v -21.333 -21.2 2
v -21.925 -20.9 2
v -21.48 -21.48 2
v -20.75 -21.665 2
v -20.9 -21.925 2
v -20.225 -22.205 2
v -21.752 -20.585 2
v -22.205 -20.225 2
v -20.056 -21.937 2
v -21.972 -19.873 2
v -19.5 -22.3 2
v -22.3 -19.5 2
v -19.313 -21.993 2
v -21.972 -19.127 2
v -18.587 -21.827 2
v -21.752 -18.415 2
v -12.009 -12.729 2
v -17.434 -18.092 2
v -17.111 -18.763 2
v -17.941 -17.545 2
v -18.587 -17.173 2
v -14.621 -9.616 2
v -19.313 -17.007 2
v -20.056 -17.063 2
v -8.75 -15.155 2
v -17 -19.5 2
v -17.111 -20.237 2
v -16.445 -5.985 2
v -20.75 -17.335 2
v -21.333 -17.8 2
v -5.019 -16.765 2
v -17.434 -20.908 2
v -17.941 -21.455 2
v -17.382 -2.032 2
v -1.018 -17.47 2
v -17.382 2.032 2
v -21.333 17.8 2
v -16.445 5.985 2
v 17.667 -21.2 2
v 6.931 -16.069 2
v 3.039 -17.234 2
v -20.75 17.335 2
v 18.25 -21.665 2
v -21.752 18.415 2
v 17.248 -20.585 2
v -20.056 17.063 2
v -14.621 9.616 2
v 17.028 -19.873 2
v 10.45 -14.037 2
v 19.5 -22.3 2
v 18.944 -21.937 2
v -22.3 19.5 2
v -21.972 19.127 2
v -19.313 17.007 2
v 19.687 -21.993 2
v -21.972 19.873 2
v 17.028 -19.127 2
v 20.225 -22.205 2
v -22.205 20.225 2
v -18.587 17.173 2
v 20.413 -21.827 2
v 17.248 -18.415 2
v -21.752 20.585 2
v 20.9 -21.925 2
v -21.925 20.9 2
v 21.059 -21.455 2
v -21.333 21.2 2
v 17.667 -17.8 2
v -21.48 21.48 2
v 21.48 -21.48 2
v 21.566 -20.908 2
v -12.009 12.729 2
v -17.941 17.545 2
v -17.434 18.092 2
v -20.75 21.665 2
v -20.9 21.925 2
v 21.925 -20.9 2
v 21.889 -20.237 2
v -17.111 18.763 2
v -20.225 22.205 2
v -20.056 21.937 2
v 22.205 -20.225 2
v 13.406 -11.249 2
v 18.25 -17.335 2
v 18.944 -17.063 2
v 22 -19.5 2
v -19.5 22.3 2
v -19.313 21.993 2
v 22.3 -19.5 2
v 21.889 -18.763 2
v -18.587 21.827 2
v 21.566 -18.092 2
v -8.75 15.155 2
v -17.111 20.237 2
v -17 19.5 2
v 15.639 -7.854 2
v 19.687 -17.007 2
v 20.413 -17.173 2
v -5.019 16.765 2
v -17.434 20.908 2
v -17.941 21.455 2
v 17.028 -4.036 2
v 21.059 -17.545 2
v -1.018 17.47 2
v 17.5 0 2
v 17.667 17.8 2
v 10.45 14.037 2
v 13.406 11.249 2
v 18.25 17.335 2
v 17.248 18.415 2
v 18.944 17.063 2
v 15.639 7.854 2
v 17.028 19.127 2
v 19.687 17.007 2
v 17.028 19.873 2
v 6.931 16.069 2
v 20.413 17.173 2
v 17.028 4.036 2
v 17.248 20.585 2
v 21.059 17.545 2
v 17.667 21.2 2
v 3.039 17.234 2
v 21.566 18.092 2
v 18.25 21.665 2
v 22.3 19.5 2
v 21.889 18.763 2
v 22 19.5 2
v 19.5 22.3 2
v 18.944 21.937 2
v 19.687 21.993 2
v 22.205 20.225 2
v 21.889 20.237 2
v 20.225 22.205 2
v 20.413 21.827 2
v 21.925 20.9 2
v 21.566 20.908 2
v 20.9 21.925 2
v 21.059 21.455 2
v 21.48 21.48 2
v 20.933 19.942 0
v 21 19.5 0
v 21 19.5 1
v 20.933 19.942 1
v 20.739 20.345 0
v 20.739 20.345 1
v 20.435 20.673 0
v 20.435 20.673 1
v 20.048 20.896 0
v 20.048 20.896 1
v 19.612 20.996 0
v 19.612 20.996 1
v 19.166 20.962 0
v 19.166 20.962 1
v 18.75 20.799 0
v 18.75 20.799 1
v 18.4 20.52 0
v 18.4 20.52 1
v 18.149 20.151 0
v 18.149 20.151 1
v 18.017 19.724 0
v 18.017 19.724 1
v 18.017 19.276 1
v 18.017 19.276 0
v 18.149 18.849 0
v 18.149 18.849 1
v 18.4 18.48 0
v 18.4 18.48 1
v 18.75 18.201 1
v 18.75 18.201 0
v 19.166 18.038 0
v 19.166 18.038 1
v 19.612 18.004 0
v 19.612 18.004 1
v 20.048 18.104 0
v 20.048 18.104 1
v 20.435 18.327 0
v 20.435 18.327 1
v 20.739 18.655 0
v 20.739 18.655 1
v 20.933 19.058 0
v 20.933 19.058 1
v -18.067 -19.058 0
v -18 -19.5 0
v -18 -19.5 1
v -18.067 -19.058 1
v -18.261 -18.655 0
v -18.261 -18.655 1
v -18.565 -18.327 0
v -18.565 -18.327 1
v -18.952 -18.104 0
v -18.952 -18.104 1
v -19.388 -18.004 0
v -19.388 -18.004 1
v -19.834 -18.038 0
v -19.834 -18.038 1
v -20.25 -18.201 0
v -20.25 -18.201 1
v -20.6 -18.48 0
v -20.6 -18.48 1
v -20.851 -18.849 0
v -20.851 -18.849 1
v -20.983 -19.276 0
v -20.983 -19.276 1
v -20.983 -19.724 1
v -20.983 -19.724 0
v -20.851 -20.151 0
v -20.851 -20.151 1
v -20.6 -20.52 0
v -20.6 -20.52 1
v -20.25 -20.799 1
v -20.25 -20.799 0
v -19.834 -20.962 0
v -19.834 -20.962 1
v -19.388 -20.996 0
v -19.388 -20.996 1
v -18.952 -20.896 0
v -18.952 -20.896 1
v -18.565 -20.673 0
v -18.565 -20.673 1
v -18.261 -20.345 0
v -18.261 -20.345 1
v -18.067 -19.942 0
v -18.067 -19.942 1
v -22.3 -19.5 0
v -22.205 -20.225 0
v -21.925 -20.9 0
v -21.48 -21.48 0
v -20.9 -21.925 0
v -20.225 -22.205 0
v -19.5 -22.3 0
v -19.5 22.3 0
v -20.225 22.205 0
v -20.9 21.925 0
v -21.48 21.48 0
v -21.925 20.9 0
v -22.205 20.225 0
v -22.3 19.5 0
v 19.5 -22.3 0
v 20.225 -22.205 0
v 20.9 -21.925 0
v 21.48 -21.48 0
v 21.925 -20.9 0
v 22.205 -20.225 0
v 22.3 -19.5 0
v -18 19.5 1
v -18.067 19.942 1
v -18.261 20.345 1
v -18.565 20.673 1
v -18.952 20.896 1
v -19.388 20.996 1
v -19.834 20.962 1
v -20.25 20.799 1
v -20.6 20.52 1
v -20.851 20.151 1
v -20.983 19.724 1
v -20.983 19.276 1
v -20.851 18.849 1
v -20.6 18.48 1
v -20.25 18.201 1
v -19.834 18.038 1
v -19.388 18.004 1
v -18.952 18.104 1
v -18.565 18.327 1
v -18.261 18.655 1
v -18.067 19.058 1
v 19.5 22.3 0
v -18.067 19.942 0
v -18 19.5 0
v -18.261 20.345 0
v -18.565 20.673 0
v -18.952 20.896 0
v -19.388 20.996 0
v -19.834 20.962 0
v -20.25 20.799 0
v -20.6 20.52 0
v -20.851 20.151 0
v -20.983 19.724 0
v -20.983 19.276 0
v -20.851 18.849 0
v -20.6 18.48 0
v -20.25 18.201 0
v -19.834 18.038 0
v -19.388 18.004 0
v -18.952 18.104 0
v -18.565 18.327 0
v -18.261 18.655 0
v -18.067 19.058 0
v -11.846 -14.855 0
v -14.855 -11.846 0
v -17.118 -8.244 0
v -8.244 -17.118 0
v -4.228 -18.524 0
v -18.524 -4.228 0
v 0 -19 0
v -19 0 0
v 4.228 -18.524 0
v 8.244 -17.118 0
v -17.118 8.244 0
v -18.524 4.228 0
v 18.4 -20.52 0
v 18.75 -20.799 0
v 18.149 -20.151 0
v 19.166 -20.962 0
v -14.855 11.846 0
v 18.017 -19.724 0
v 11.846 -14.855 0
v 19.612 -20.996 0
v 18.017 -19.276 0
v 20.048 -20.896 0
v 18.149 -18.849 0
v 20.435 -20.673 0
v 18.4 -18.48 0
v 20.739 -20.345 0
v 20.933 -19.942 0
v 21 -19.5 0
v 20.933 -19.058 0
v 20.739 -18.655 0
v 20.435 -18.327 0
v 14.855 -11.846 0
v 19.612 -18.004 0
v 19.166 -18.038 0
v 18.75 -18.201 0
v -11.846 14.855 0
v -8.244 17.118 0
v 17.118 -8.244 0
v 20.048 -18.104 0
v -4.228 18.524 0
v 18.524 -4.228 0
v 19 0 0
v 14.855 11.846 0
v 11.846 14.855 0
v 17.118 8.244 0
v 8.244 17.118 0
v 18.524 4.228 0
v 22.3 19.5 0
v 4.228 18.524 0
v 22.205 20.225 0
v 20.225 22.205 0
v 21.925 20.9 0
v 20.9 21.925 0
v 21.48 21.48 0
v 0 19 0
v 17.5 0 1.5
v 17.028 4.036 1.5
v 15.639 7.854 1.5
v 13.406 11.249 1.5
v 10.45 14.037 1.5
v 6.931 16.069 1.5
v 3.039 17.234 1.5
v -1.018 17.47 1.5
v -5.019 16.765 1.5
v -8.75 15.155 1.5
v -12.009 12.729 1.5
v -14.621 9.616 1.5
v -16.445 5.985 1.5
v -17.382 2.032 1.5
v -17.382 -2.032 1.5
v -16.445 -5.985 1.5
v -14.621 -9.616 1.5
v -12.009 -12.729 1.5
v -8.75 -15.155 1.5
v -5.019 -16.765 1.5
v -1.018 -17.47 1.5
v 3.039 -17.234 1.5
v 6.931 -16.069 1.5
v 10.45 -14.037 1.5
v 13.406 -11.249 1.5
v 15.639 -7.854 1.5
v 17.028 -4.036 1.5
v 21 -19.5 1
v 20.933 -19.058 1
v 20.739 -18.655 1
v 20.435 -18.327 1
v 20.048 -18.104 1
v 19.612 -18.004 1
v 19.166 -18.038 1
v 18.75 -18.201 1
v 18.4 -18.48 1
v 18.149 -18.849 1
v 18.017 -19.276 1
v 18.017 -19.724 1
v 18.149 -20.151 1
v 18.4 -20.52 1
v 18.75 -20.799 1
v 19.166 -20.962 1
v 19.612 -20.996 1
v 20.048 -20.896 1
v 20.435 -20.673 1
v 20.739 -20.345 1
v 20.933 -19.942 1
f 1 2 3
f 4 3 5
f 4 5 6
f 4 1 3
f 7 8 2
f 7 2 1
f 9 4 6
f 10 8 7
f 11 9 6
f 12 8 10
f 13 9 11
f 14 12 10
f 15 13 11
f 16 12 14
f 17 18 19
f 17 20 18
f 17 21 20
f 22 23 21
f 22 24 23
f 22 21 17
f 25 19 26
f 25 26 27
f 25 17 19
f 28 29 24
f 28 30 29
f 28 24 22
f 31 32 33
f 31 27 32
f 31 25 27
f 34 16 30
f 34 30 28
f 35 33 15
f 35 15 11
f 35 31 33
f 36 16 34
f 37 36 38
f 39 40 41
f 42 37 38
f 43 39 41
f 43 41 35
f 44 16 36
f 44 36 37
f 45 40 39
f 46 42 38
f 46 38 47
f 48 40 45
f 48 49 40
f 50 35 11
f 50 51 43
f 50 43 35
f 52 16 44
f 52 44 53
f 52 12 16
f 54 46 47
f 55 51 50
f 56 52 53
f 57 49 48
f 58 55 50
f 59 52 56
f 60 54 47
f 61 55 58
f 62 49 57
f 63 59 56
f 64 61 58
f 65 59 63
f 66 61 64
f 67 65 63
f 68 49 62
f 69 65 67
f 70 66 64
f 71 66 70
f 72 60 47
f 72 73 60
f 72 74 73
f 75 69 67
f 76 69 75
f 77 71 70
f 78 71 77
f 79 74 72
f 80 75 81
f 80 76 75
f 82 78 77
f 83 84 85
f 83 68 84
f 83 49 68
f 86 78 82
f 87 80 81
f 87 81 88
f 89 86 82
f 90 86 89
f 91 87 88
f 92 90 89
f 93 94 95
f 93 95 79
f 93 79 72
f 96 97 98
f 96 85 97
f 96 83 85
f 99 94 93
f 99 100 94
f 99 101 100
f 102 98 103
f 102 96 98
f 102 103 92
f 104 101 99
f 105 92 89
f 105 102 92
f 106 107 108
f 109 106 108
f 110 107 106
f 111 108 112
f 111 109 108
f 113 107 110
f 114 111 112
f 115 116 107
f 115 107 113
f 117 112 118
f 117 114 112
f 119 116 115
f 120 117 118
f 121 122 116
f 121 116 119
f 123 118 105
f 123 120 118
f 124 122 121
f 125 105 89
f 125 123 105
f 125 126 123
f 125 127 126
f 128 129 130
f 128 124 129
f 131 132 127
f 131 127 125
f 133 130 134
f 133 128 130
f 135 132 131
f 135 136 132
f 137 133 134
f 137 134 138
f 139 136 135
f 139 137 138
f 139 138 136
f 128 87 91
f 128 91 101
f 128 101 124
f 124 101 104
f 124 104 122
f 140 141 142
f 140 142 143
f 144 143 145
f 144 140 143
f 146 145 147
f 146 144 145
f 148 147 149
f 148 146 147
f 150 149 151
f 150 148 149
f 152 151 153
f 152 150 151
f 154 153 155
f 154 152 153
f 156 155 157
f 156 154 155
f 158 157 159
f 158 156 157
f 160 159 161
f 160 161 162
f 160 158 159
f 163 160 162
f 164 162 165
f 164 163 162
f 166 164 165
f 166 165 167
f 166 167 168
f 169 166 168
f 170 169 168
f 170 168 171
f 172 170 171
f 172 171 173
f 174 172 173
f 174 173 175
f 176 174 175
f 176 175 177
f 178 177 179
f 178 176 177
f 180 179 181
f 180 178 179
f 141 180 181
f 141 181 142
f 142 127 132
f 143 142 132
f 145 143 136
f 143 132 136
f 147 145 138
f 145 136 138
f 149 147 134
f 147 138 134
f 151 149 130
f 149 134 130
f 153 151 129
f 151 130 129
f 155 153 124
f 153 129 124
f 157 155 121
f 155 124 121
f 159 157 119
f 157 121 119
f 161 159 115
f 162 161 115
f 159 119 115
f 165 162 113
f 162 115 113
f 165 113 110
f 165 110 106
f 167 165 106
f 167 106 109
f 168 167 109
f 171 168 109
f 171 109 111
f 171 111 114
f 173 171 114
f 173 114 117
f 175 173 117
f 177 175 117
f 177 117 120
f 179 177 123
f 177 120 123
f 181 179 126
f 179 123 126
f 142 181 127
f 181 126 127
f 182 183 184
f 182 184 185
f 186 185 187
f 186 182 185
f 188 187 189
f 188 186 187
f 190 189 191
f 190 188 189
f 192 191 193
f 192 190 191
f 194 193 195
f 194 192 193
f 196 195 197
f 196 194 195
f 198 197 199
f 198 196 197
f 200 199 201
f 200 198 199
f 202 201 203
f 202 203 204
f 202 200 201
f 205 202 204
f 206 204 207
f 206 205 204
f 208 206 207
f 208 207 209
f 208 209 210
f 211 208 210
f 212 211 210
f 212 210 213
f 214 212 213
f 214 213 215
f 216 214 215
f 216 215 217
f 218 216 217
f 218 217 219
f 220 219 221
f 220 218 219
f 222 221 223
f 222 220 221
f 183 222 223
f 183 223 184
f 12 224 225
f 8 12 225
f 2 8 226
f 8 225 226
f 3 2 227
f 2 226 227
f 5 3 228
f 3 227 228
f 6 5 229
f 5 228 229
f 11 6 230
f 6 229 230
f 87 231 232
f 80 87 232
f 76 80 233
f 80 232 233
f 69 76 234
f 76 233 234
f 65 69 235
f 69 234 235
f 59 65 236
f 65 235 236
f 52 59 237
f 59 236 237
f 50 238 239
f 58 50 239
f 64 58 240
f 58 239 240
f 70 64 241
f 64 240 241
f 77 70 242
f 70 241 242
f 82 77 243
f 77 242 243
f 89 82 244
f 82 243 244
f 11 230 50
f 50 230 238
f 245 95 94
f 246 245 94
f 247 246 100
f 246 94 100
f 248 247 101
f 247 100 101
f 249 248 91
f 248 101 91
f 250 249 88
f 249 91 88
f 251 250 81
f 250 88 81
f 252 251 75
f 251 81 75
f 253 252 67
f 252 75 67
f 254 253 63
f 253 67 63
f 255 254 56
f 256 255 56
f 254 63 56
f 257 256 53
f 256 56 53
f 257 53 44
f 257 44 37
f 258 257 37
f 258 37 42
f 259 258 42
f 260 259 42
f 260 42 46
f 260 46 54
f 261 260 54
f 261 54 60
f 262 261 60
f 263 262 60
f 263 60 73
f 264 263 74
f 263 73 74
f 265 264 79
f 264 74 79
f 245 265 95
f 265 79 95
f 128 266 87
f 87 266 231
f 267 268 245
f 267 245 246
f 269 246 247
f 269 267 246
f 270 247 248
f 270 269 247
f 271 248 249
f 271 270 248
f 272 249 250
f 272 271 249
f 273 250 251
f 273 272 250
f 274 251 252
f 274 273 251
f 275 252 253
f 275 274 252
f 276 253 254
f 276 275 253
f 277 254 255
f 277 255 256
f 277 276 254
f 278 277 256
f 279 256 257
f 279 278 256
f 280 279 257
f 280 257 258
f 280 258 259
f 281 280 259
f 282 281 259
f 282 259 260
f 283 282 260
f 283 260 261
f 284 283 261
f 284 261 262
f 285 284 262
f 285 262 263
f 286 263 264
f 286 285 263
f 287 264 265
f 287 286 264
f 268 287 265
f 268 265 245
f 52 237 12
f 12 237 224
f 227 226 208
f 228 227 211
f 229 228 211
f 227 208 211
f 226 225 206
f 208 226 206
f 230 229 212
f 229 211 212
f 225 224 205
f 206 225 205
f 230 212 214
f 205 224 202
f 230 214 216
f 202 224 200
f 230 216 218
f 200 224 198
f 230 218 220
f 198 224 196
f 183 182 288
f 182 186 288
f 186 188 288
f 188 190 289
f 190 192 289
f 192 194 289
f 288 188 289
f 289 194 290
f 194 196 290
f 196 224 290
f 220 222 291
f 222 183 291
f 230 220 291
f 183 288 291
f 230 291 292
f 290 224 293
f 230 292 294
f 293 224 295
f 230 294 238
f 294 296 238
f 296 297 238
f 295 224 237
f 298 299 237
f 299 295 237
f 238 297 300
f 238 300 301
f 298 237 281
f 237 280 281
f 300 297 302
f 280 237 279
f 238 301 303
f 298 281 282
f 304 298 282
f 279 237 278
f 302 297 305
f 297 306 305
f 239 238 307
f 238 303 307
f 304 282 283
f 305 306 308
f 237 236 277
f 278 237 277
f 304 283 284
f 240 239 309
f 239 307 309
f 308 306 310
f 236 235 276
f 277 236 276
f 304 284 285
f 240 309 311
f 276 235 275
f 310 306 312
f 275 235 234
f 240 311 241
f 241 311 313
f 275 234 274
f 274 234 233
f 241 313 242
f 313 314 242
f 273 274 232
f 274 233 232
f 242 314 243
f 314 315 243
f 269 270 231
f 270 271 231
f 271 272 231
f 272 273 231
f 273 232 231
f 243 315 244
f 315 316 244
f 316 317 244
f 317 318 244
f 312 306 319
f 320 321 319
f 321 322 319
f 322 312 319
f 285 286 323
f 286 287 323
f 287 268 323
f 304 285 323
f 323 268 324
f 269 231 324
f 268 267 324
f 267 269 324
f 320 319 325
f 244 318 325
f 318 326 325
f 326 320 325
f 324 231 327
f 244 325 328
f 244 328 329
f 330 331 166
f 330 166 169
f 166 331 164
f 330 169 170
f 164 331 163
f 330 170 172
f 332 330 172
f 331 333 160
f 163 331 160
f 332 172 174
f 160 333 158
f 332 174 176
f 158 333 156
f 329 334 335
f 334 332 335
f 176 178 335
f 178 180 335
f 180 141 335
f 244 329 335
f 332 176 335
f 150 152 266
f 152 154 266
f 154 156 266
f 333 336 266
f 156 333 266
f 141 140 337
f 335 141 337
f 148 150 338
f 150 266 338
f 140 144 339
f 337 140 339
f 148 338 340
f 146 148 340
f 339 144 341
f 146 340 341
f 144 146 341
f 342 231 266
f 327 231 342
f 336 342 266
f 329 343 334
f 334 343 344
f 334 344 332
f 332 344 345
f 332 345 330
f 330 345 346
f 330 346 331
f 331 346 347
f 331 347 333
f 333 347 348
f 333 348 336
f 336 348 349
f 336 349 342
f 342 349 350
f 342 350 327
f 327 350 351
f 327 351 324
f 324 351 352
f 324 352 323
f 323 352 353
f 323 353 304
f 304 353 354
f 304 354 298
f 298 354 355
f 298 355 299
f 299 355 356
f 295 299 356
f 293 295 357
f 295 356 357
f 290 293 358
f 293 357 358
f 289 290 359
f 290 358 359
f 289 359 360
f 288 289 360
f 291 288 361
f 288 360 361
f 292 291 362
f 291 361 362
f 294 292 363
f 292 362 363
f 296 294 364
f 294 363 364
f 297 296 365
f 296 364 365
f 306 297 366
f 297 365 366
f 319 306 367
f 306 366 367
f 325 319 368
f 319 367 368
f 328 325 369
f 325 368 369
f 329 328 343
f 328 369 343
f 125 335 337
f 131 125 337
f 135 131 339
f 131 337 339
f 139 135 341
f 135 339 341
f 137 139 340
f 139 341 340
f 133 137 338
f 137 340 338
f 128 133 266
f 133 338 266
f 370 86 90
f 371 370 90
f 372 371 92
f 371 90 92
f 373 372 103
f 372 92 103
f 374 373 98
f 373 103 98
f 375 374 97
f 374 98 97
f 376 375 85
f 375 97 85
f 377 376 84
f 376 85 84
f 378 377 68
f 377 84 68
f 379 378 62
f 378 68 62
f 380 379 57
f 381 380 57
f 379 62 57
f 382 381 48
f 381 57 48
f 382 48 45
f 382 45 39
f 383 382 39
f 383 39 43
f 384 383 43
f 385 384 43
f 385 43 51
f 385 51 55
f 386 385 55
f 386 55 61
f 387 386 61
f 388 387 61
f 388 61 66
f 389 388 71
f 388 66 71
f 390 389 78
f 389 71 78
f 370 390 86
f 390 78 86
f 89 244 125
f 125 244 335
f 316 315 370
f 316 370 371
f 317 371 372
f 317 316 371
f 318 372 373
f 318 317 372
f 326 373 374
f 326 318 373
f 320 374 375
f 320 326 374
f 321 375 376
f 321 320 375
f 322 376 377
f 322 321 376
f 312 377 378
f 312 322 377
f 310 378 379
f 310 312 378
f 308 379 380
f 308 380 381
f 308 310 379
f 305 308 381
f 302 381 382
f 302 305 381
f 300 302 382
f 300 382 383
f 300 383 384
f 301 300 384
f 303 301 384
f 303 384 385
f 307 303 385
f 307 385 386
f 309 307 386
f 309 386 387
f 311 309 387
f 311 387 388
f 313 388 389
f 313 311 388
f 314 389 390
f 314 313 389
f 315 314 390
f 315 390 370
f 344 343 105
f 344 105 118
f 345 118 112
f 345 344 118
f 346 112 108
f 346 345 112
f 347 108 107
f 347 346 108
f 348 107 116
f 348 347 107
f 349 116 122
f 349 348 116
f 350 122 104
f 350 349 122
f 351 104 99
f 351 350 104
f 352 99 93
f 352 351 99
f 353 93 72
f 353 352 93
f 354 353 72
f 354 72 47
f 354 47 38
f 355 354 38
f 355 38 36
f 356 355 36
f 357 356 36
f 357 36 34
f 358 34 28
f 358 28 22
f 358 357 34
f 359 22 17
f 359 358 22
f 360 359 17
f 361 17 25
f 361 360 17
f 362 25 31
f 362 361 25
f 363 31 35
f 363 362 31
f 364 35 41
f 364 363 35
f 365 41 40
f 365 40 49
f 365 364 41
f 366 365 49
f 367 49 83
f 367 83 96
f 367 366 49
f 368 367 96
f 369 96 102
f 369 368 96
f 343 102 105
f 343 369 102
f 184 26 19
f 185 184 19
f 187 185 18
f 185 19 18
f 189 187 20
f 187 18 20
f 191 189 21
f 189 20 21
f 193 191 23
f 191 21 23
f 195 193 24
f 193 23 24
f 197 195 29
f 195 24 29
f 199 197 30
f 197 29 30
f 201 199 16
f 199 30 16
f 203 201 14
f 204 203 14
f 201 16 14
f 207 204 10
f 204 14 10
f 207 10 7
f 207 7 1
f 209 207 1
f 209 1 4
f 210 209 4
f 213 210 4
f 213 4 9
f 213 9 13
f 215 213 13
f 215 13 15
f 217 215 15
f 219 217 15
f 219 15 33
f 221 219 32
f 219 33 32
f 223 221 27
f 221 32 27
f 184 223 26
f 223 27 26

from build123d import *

# Parameters (mm, degrees)
F0_R     = 1.5
F0_R_2   = 19
F0_R_3   = 17.5
F1_DEPTH = 2
F2_SIZE  = 1
F3_SIZE  = 1.5


with BuildPart() as f1:
    # F0 (on Top) → F1 (new body)
    with BuildSketch(Plane.XY):
        with BuildLine():
            Line((-22.3, 19.5), (-22.3, -19.5))
            ThreePointArc((-22.3, -19.5), (-21.4798989873, -21.4798989873), (-19.5, -22.3))
            Line((-19.5, -22.3), (19.5, -22.3))
            ThreePointArc((19.5, -22.3), (21.4798989873, -21.4798989873), (22.3, -19.5))
            Line((22.3, -19.5), (22.3, 19.5))
            ThreePointArc((22.3, 19.5), (21.4798989873, 21.4798989873), (19.5, 22.3))
            Line((19.5, 22.3), (-19.5, 22.3))
            ThreePointArc((-19.5, 22.3), (-21.4798989873, 21.4798989873), (-22.3, 19.5))
        make_face()
        with Locations((-19.5, -19.5)):
            Circle(F0_R, mode=Mode.SUBTRACT)
        with Locations((19.5, -19.5)):
            Circle(F0_R, mode=Mode.SUBTRACT)
        with Locations((-19.5, 19.5)):
            Circle(F0_R, mode=Mode.SUBTRACT)
        Circle(F0_R_2, mode=Mode.SUBTRACT)
        with Locations((19.5, 19.5)):
            Circle(F0_R, mode=Mode.SUBTRACT)
        Circle(F0_R_2)
        Circle(F0_R_3, mode=Mode.SUBTRACT)
    extrude(amount=F1_DEPTH)

    # F2
    f2_edges = [f1.edges().sort_by_distance(p)[0] for p in [
        (-21, 19.5, 2),
        (18, 19.5, 2),
        (18, -19.5, 2),
        (-21, -19.5, 2),
    ]]
    chamfer(f2_edges, length=F2_SIZE)

    # F3
    f3_edges = [f1.edges().sort_by_distance(p)[0] for p in [
        (-17.5, 0, 0),
    ]]
    chamfer(f3_edges, length=F3_SIZE)


solid = f1.part
